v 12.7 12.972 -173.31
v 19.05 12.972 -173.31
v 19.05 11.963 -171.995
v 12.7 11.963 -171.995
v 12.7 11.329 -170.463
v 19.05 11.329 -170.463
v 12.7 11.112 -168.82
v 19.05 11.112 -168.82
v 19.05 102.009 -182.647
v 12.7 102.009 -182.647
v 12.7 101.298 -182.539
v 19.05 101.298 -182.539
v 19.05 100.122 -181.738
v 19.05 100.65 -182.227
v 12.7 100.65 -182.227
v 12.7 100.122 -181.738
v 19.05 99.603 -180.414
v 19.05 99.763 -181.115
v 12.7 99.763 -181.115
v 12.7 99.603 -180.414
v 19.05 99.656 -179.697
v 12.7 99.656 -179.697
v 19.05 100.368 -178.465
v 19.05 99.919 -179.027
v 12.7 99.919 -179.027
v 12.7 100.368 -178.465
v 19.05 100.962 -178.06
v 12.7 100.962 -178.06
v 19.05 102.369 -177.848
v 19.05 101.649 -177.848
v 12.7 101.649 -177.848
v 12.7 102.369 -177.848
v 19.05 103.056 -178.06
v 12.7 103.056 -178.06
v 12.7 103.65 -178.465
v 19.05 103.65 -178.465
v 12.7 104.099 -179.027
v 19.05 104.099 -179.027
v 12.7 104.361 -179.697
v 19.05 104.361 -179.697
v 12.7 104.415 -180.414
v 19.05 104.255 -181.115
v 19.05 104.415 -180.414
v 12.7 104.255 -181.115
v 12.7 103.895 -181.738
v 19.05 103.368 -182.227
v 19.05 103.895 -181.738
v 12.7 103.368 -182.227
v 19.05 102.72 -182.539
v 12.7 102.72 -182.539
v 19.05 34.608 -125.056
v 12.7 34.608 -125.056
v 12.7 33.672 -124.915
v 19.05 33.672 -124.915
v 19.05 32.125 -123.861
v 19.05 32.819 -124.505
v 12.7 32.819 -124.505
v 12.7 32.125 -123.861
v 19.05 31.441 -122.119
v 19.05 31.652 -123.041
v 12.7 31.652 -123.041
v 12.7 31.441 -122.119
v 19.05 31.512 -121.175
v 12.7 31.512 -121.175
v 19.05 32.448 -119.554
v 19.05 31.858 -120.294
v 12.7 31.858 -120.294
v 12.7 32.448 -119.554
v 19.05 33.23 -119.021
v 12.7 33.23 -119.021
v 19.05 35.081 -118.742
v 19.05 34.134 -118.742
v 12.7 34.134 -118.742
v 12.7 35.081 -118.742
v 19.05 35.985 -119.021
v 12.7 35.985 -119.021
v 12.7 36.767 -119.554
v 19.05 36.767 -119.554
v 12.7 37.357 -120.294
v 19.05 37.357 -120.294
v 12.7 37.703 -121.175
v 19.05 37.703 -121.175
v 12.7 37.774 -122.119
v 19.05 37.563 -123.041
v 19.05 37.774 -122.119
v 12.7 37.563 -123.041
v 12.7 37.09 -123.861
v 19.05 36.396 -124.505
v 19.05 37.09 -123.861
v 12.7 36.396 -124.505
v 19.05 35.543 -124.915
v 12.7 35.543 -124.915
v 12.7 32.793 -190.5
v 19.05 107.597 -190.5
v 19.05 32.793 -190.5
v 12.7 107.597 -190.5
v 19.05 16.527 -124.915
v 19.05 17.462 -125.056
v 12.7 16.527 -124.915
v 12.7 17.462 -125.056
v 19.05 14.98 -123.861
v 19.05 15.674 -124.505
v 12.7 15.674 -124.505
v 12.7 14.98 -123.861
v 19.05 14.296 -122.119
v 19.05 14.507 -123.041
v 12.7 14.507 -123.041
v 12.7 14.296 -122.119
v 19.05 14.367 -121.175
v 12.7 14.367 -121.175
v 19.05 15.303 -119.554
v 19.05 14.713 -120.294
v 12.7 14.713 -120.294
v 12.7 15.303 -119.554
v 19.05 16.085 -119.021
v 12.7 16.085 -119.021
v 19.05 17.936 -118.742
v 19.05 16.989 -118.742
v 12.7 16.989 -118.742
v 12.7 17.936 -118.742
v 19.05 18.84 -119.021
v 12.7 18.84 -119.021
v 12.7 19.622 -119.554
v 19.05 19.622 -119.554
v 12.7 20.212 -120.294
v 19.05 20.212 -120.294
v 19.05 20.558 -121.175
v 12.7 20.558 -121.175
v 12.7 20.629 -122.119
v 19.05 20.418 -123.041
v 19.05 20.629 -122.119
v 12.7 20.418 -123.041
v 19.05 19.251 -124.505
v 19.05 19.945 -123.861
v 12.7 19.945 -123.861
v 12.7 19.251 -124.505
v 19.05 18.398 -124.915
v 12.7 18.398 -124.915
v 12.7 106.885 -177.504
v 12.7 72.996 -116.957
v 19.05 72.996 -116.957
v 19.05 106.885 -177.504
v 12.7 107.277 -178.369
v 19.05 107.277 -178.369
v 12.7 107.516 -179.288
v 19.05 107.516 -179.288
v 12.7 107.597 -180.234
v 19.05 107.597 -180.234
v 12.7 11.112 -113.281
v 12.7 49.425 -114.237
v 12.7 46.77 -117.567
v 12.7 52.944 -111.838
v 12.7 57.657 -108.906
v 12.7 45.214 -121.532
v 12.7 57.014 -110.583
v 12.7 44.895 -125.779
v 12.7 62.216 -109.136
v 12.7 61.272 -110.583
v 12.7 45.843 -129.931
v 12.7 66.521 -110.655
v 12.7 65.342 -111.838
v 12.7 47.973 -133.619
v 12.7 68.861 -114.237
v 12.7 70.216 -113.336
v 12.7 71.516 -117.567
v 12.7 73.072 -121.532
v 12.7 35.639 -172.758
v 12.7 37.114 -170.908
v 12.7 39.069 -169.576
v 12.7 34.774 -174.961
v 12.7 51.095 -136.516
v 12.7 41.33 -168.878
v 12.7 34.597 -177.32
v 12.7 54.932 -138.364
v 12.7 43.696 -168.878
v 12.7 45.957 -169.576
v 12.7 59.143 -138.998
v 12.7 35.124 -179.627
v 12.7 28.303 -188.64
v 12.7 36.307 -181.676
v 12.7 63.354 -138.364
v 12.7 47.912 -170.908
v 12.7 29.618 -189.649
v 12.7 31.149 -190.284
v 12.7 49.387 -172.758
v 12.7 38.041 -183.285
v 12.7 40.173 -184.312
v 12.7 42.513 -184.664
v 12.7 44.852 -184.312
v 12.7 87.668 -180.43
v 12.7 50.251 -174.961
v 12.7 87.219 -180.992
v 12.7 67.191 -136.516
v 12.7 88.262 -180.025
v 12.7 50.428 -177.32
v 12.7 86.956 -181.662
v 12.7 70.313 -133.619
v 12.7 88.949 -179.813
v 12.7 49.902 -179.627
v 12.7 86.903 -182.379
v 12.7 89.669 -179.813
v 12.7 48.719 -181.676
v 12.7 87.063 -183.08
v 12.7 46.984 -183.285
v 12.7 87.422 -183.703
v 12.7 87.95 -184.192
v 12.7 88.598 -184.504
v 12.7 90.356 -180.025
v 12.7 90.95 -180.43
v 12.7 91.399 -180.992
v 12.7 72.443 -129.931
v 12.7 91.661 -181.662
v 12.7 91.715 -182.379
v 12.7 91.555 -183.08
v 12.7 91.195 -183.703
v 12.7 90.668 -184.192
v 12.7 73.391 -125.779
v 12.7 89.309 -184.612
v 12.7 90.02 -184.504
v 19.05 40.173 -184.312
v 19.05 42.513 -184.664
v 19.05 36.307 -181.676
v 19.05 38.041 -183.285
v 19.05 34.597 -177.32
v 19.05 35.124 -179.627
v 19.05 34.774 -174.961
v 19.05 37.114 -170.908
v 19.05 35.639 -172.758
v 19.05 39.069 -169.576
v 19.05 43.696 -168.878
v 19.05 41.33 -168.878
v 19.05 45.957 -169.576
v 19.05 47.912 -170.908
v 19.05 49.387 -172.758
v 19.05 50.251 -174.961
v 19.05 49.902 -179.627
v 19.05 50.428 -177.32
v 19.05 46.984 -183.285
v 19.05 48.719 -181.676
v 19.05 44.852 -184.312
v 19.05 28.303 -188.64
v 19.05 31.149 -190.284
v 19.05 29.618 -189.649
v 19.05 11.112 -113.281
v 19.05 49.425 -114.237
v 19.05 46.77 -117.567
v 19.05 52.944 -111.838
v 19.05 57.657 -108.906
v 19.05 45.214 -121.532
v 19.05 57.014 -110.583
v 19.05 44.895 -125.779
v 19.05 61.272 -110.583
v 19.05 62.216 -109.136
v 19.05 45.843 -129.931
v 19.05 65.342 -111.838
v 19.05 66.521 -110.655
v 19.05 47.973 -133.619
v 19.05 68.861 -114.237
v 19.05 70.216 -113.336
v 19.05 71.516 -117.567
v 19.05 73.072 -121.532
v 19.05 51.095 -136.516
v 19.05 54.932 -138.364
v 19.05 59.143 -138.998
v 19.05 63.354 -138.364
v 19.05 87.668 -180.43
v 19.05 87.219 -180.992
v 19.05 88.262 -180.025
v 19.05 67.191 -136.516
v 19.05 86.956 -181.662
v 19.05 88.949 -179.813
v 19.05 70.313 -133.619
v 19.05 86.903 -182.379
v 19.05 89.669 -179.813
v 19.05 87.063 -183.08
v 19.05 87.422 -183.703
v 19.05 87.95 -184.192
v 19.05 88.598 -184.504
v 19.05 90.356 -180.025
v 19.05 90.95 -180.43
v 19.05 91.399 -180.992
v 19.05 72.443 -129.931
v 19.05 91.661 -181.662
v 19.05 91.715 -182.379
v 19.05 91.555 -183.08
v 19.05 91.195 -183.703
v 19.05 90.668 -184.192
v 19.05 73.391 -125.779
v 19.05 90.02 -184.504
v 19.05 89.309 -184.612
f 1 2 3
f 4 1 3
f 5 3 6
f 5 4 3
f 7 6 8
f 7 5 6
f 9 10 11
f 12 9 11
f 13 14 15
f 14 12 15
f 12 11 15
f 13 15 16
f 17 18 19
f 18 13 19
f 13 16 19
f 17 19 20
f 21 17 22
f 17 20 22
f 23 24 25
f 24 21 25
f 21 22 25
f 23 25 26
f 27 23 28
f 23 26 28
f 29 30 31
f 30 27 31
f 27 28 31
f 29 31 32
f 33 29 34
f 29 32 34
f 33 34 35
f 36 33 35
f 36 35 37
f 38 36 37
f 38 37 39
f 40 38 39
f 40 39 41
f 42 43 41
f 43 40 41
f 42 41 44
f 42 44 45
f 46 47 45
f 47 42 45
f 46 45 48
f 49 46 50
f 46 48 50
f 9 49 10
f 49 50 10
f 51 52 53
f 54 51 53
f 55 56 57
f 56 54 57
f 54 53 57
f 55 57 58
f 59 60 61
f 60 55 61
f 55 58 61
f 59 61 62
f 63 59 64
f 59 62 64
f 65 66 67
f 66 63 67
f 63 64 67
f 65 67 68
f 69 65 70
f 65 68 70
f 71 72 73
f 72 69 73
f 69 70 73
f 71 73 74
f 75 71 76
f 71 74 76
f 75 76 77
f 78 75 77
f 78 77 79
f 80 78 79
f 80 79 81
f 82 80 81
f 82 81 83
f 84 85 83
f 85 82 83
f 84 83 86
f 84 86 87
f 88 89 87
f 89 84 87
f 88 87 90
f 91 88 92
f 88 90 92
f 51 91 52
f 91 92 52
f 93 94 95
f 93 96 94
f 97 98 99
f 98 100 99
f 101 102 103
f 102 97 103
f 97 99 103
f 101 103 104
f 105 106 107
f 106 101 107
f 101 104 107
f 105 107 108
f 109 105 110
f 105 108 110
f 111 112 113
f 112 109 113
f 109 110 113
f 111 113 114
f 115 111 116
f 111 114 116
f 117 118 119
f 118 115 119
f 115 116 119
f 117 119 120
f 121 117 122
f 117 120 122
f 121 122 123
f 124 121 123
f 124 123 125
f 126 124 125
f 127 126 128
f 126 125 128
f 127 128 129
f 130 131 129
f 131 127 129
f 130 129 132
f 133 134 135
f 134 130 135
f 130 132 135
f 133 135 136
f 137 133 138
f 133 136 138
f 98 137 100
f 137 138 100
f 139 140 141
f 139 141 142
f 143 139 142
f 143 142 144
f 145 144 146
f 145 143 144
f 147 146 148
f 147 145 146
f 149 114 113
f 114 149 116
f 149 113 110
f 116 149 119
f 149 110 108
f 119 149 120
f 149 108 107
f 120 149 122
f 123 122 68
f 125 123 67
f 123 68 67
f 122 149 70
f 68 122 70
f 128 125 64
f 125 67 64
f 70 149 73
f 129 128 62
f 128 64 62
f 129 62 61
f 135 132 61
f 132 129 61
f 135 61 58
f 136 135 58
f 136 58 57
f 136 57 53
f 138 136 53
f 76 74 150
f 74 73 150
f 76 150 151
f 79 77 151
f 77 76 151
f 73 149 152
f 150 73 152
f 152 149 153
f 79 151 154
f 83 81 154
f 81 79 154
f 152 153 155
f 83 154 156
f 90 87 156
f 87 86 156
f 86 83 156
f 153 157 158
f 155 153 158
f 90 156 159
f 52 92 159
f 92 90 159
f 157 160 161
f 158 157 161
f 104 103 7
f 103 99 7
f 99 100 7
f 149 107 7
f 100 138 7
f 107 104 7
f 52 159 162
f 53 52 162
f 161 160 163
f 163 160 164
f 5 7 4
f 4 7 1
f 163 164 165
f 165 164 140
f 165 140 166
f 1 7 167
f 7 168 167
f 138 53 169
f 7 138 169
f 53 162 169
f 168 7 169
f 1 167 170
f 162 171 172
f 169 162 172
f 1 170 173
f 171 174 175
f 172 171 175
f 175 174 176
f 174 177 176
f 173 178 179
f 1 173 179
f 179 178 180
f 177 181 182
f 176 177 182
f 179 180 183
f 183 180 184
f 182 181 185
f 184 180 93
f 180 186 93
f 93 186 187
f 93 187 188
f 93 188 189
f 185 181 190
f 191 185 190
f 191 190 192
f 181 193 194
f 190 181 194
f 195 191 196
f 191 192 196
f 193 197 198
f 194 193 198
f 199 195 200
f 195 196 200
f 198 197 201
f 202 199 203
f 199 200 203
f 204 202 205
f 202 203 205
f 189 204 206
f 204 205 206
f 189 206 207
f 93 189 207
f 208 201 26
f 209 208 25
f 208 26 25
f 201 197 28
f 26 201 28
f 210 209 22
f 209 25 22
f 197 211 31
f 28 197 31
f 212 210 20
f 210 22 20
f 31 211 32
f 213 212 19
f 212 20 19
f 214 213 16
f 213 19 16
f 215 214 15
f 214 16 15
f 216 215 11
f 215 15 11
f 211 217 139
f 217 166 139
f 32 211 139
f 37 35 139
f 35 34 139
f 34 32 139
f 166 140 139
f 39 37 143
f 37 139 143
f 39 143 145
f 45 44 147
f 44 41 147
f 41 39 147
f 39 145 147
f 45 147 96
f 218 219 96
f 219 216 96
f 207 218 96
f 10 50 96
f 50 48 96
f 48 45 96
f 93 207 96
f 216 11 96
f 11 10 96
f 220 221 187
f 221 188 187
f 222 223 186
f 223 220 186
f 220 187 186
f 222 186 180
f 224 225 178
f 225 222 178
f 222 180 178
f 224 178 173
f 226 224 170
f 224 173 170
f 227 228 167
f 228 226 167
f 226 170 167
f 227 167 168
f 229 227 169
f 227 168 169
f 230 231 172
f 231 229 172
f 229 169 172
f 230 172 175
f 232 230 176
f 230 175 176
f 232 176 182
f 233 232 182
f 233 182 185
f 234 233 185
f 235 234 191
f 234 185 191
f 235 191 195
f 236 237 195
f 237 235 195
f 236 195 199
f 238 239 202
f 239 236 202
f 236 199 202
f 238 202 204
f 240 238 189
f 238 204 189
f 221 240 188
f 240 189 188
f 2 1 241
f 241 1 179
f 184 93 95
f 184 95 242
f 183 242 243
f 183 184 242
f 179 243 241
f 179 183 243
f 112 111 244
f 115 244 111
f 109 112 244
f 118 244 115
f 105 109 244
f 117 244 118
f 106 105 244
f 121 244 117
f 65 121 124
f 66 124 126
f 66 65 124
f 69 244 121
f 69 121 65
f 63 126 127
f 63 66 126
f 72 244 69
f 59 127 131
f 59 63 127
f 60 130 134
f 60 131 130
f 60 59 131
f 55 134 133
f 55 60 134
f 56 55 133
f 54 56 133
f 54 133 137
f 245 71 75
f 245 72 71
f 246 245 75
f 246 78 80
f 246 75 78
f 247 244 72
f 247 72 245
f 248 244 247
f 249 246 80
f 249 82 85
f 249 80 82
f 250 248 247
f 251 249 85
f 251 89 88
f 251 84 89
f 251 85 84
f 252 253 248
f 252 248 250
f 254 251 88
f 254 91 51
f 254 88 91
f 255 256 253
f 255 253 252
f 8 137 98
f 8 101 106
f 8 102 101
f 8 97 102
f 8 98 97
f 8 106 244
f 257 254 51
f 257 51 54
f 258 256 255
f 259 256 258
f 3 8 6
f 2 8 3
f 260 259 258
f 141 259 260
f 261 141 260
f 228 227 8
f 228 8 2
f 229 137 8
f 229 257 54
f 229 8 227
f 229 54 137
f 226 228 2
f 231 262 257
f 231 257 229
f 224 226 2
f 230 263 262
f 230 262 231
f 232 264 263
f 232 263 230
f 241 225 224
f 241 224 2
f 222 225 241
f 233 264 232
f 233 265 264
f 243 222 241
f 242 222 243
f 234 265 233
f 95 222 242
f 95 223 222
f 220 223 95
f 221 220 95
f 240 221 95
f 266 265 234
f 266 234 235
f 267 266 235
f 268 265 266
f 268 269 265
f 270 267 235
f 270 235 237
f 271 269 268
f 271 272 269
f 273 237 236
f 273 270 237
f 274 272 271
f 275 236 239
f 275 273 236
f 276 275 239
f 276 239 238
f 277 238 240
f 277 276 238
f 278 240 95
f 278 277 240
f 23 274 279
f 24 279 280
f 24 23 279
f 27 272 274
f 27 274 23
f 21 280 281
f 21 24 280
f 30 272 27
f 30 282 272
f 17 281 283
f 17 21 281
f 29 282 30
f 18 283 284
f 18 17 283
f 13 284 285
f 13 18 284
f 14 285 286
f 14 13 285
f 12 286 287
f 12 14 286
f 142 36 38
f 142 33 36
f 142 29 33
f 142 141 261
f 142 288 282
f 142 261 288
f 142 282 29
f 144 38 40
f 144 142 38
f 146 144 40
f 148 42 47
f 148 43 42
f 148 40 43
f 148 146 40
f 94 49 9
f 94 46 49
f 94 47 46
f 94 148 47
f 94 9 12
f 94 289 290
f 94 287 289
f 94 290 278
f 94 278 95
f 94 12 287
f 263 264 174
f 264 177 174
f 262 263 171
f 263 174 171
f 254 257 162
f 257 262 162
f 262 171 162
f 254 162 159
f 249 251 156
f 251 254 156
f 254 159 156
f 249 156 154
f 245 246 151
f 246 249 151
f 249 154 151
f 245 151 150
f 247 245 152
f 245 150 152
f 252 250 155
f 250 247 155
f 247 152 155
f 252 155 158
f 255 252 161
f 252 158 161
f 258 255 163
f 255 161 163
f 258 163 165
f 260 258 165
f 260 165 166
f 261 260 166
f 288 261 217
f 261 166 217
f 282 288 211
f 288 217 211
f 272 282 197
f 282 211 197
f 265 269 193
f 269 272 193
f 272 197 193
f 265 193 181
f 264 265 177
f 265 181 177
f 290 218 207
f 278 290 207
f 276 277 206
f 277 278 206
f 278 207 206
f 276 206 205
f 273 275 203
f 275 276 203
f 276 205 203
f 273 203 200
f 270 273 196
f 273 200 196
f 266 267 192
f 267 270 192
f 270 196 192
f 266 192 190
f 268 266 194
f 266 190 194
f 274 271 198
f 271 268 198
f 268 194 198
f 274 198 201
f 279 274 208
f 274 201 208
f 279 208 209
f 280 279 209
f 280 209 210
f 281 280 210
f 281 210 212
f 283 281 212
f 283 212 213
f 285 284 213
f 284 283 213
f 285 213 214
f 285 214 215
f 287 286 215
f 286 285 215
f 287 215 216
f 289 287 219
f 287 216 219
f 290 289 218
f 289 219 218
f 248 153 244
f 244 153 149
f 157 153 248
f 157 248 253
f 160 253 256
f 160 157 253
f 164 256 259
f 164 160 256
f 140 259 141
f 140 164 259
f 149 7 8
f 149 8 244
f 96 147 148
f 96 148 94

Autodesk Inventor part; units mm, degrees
ref_plane "YZ Plane" through (0, 0, 0) normal (1, 0, 0) x (0, 1, 0)
ref_plane "XZ Plane" through (0, 0, 0) normal (0, 1, 0) x (-1, 0, 0)
sketch "Sketch1" plane through (0, 0, 0) normal (1, 0, 0) x (0, 1, 0)
  line L0 (111.125, 190.5) -> (68.3957, 190.5)
  line L1 (20.2274, 160.5064) -> (-11.1661, 102.5705)
  arc A0 (-11.1661, 102.5705) -> (-11.1661, 90.4695) centre (0, 96.52) ccw
  line L2 (-11.1661, 90.4695) -> (7.6076, 55.8231)
  arc A1 (-11.1661, 6.0505) -> (-11.1661, -6.0505) centre (0, 0) ccw
  line L3 (-11.1661, -6.0505) -> (7.6076, -40.6969)
  arc A2 (-11.1661, -90.4695) -> (-11.3095, -102.2979) centre (0, -96.52) ccw
  line L4 (-11.3095, -102.2979) -> (18.6694, -160.9782)
  line L5 (67.5494, -190.5) -> (111.125, -190.5)
  line L6 (111.125, -190.5) -> (111.125, 190.5)
  arc A3 (20.2274, 160.5064) -> (68.3957, 190.5) centre (42.5128, 178.392) ccw
  arc A4 (67.5494, -190.5) -> (18.6694, -160.9782) centre (42.5128, -176.727) ccw
  circle A5 centre (42.5128, 178.392) radius 4.7625 construction
  circle A6 centre (34.925, -92.075) radius 7.9375 projected
  circle A7 centre (73.5908, -125.0234) radius 6.35 construction
  circle A8 centre (42.5128, -176.727) radius 4.7625 construction
  line L7 (111.125, 0) -> (0, 0) construction
  circle A9 centre (0, 96.52) radius 2.4892 construction
  circle A10 centre (0, 0) radius 2.4892 construction
  circle A11 centre (0, -96.52) radius 2.4892 construction
  line L8 (-11.1661, 6.0505) -> (7.6076, 40.6969)
  arc A12 (7.6076, 40.6969) -> (7.6076, 55.8231) centre (-6.35, 48.26) ccw
  line L9 (-11.1661, -90.4695) -> (7.6076, -55.8231)
  arc A13 (7.6076, -55.8231) -> (7.6076, -40.6969) centre (-6.35, -48.26) ccw
  line L10 (-6.35, -48.26) -> (-6.35, 48.26) construction
  line L11 (-6.35, 0) -> (0, 0) construction
  circle A14 centre (0, 96.52) radius 3.175
  circle A15 centre (0, 0) radius 3.175
  circle A16 centre (0, -96.52) radius 3.175
  circle A17 centre (46.0375, 122.682) radius 3.5687 construction
  circle A18 centre (20.6375, 122.682) radius 3.5687 construction
  circle A19 centre (46.0375, 122.682) radius 3.175
  circle A20 centre (20.6375, 122.682) radius 3.175
  line L12 (0, 96.52) -> (-12.7, 96.52) construction
  circle A21 centre (99.3625, 57.065) radius 2.0193
  circle A22 centre (47.625, -17.78) radius 2.0193
  circle A23 centre (99.3625, 31.665) radius 2.0193
  circle A24 centre (73.9625, 57.065) radius 2.0193
  circle A25 centre (73.9625, 31.665) radius 2.0193
  circle A26 centre (47.625, -43.18) radius 2.0193
  circle A27 centre (22.225, -17.78) radius 2.0193
  circle A28 centre (22.225, -43.18) radius 2.0193
  circle A29 centre (85.725, 107.103) radius 7.9375
  line L13 (-12.7, 173.6352) -> (-12.7, -210.2893) construction
  circle A30 centre (85.725, 107.103) radius 17.78 construction
  circle A31 centre (79.375, 147.2439) radius 22.86 construction
  circle A32 centre (42.5128, 178.392) radius 25.4 construction
  line L14 (110.475, 71.035) -> (60.975, 71.035) construction
  line L15 (60.975, 71.035) -> (60.975, -72.669) construction
  line L16 (60.975, -72.669) -> (110.475, -72.669) construction
  line L17 (110.475, -72.669) -> (110.475, 71.035) construction
  line L18 (58.7375, 86.554) -> (9.2375, 86.554) construction
  line L19 (9.2375, 86.554) -> (9.2375, -57.15) construction
  line L20 (9.2375, -57.15) -> (58.7375, -57.15) construction
  line L21 (58.7375, -57.15) -> (58.7375, 86.554) construction
  line L22 (9.525, 127) -> (-15.875, 127) construction
  line L23 (-15.875, 127) -> (-15.875, -177.8) construction
  line L24 (-15.875, -177.8) -> (9.525, -177.8) construction
  line L25 (9.525, -177.8) -> (9.525, 127) construction
  circle A33 centre (34.925, -92.075) radius 17.78 construction
  circle A34 centre (73.5908, -125.0234) radius 28.575 construction
  circle A35 centre (42.5128, -176.727) radius 31.75 construction
  circle A36 centre (102.0089, 180.2336) radius 2.413
  circle A37 centre (89.3089, 182.1987) radius 2.413
  circle A38 centre (102.0089, -180.2336) radius 2.413
  circle A39 centre (89.3089, -182.1987) radius 2.413
  circle A40 centre (79.375, 147.2439) radius 14.2875
  circle A41 centre (66.675, 254) radius 60.325 construction
  circle A42 centre (66.675, -254) radius 60.325 construction
  circle A43 centre (73.5908, -125.0234) radius 14.2875
  circle A44 centre (80.899, -155.6385) radius 47.527 construction
  circle A45 centre (100.0125, -85.369) radius 3.175
  circle A46 centre (74.6125, -85.369) radius 3.175
  circle A47 centre (100.0125, -85.369) radius 6.35 construction
  circle A48 centre (74.6125, -85.369) radius 6.35 construction
  circle A49 centre (46.0375, 122.682) radius 6.35 construction
  circle A50 centre (20.6375, 122.682) radius 6.35 construction
  circle A51 centre (34.6075, -121.8815) radius 3.175
  circle A52 centre (17.4625, -121.8815) radius 3.175
  circle A53 centre (34.6075, -121.8815) radius 6.35 construction
  circle A54 centre (17.4625, -121.8815) radius 6.35 construction
  circle A55 centre (101.6, 78.9725) radius 3.175
  circle A56 centre (101.6, 78.9725) radius 6.35 construction
  line L26 (92.075, 107.103) -> (79.375, 107.103) construction
  line L27 (79.375, 107.103) -> (79.375, 71.035) construction
  line L28 (79.375, 71.035) -> (92.075, 71.035) construction
  line L29 (92.075, 71.035) -> (92.075, 107.103) construction
  line L30 (85.725, 107.103) -> (85.725, 71.035) construction
  circle A57 centre (69.85, 78.9725) radius 3.175
  circle A58 centre (69.85, 78.9725) radius 6.35 construction
  circle A59 centre (59.143, -124.7108) radius 14.2875
  circle A60 centre (59.143, -124.7108) radius 22.86 construction
  dimension "d2" = 15.875
  dimension "d3" = 6.35
  dimension "d4" = 96.52
  dimension "d8" = 6.35
  dimension "d9" = 381
  dimension "d11" = 28.575
  dimension "d12" = 12.7
  dimension "d135" = 4.0386
  dimension "d136" = 4.0386
  dimension "d139" = 25.4
  dimension "d142" = 25.4
  dimension "d147" = 25.4
  dimension "d150" = 25.4
  dimension "d155" = 12.7
  dimension "d156" = 48.895
  dimension "d225" = 15.875
  dimension "d226" = 25.4
  dimension "d227" = 50.038
  dimension "d229" = 123.825
  dimension "d230" = 35.56
  dimension "d231" = 45.72
  dimension "d232" = 50.8
  dimension "d233" = 49.5
  dimension "d234" = 143.704
  dimension "d235" = 13.97
  dimension "d236" = 11.1125
  dimension "d237" = 143.704
  dimension "d238" = 49.5
  dimension "d239" = 11.1125
  dimension "d240" = 13.97
  dimension "d242" = 25.4
  dimension "d243" = 304.8
  dimension "d245" = 9.525
  dimension "d246" = 35.56
  dimension "d247" = 57.15
  dimension "d248" = 63.5
  dimension "d249" = 28.575
  dimension "d250" = 31.75
  dimension "d251" = 4.826
  dimension "d252" = 4.826
  dimension "d253" = 4.826
  dimension "d254" = 4.826
  dimension "d256" = 9.1161
  dimension "d257" = 12.7
  dimension "d258" = 1.9652
  dimension "d259" = 10.2664
  dimension "d260" = 12.7
  dimension "d261" = 1.9652
  dimension "d262" = 9.1161
  dimension "d263" = 10.2664
  dimension "d264" = 120.65
  dimension "d265" = 120.65
  dimension "d266" = 44.45
  dimension "d267" = 63.5
  dimension "d268" = 63.5
  dimension "d269" = 28.575
  dimension "d270" = 98.3615
  dimension "d271" = 14.224
  dimension "d272" = 95.054
  dimension "d273" = 6.35
  dimension "d274" = 6.35
  dimension "d275" = 25.4
  dimension "d276" = 11.1125
  dimension "d277" = 12.7
ref_plane "Work Plane1" through (12.7, 0, 0) normal (1, 0, 0) x (0, 0, -1)
sketch "Sketch13" plane through (12.7, 0, 0) normal (1, 0, 0) x (0, 0, -1)
  circle A0 centre (180.2336, 102.0089) radius 2.413 projected
  circle A1 centre (182.1987, 89.3089) radius 2.413 projected
  circle A2 centre (176.727, 42.5128) radius 4.7625 construction
  line L0 (177.8, 9.525) -> (-127, 9.525) construction
  line L1 (177.8, -15.875) -> (177.8, 9.525) construction
  circle A3 centre (121.8815, 34.6075) radius 3.175 projected
  circle A4 centre (121.8815, 17.4625) radius 3.175 projected
  line L2 (190.5, 111.125) -> (-190.5, 111.125) projected
  line L3 (190.5, 72.4418) -> (190.5, 111.125) projected
  circle A5 centre (124.7108, 59.143) radius 15.875
  circle A6 centre (180.2336, 102.0089) radius 5.588
  circle A7 centre (182.1987, 89.3089) radius 5.588
  circle A8 centre (176.727, 42.5128) radius 7.9375
  circle A9 centre (121.8815, 34.6075) radius 6.35
  circle A10 centre (121.8815, 17.4625) radius 6.35
  circle A11 centre (125.0234, 73.5908) radius 28.575 construction
  circle A12 centre (92.075, 34.925) radius 22.225 construction
  circle A13 centre (176.727, 42.5128) radius 31.75 construction
  line L4 (116.9572, 72.9957) -> (177.5043, 106.8851)
  line L5 (180.2336, 107.5969) -> (190.5, 107.5969)
  line L6 (168.8197, 11.1125) -> (113.2813, 11.1125)
  line L7 (108.9055, 57.6571) -> (113.2813, 11.1125)
  line L8 (173.3099, 12.9724) -> (188.6401, 28.3026)
  line L9 (190.5, 72.4418) -> (190.5, 32.7928)
  arc A14 (168.8197, 11.1125) -> (173.3099, 12.9724) centre (168.8197, 17.4625) ccw
  arc A15 (188.6401, 28.3026) -> (190.5, 32.7928) centre (184.15, 32.7928) ccw
  circle A16 centre (124.7108, 59.143) radius 14.2875 projected
  point P0 (0, 0)
  point P1 (190.5, 30.1625)
  point P2 (171.45, 11.1125)
  point P3 (121.8815, 11.1125)
  dimension "d299" = 3.175
  dimension "d300" = 3.175
  dimension "d303" = 15.875
  dimension "d304" = 12.7
  dimension "d305" = 12.7
  dimension "d307" = 19.05
  dimension "d308" = 19.05
  dimension "d309" = 6.35
  dimension "d310" = 6.35
  dimension "d313" = 31.75
extrude "Extrusion14" add sketch "Sketch13" along normal blind 6.35 contours A10 | L9 A15 L8 A14 L6 L7 A5 L4 A6 L5 L3 | A6 | A5 | A7 | A9
properties part number "OuterDriveRail" material "Aluminum 6061"
